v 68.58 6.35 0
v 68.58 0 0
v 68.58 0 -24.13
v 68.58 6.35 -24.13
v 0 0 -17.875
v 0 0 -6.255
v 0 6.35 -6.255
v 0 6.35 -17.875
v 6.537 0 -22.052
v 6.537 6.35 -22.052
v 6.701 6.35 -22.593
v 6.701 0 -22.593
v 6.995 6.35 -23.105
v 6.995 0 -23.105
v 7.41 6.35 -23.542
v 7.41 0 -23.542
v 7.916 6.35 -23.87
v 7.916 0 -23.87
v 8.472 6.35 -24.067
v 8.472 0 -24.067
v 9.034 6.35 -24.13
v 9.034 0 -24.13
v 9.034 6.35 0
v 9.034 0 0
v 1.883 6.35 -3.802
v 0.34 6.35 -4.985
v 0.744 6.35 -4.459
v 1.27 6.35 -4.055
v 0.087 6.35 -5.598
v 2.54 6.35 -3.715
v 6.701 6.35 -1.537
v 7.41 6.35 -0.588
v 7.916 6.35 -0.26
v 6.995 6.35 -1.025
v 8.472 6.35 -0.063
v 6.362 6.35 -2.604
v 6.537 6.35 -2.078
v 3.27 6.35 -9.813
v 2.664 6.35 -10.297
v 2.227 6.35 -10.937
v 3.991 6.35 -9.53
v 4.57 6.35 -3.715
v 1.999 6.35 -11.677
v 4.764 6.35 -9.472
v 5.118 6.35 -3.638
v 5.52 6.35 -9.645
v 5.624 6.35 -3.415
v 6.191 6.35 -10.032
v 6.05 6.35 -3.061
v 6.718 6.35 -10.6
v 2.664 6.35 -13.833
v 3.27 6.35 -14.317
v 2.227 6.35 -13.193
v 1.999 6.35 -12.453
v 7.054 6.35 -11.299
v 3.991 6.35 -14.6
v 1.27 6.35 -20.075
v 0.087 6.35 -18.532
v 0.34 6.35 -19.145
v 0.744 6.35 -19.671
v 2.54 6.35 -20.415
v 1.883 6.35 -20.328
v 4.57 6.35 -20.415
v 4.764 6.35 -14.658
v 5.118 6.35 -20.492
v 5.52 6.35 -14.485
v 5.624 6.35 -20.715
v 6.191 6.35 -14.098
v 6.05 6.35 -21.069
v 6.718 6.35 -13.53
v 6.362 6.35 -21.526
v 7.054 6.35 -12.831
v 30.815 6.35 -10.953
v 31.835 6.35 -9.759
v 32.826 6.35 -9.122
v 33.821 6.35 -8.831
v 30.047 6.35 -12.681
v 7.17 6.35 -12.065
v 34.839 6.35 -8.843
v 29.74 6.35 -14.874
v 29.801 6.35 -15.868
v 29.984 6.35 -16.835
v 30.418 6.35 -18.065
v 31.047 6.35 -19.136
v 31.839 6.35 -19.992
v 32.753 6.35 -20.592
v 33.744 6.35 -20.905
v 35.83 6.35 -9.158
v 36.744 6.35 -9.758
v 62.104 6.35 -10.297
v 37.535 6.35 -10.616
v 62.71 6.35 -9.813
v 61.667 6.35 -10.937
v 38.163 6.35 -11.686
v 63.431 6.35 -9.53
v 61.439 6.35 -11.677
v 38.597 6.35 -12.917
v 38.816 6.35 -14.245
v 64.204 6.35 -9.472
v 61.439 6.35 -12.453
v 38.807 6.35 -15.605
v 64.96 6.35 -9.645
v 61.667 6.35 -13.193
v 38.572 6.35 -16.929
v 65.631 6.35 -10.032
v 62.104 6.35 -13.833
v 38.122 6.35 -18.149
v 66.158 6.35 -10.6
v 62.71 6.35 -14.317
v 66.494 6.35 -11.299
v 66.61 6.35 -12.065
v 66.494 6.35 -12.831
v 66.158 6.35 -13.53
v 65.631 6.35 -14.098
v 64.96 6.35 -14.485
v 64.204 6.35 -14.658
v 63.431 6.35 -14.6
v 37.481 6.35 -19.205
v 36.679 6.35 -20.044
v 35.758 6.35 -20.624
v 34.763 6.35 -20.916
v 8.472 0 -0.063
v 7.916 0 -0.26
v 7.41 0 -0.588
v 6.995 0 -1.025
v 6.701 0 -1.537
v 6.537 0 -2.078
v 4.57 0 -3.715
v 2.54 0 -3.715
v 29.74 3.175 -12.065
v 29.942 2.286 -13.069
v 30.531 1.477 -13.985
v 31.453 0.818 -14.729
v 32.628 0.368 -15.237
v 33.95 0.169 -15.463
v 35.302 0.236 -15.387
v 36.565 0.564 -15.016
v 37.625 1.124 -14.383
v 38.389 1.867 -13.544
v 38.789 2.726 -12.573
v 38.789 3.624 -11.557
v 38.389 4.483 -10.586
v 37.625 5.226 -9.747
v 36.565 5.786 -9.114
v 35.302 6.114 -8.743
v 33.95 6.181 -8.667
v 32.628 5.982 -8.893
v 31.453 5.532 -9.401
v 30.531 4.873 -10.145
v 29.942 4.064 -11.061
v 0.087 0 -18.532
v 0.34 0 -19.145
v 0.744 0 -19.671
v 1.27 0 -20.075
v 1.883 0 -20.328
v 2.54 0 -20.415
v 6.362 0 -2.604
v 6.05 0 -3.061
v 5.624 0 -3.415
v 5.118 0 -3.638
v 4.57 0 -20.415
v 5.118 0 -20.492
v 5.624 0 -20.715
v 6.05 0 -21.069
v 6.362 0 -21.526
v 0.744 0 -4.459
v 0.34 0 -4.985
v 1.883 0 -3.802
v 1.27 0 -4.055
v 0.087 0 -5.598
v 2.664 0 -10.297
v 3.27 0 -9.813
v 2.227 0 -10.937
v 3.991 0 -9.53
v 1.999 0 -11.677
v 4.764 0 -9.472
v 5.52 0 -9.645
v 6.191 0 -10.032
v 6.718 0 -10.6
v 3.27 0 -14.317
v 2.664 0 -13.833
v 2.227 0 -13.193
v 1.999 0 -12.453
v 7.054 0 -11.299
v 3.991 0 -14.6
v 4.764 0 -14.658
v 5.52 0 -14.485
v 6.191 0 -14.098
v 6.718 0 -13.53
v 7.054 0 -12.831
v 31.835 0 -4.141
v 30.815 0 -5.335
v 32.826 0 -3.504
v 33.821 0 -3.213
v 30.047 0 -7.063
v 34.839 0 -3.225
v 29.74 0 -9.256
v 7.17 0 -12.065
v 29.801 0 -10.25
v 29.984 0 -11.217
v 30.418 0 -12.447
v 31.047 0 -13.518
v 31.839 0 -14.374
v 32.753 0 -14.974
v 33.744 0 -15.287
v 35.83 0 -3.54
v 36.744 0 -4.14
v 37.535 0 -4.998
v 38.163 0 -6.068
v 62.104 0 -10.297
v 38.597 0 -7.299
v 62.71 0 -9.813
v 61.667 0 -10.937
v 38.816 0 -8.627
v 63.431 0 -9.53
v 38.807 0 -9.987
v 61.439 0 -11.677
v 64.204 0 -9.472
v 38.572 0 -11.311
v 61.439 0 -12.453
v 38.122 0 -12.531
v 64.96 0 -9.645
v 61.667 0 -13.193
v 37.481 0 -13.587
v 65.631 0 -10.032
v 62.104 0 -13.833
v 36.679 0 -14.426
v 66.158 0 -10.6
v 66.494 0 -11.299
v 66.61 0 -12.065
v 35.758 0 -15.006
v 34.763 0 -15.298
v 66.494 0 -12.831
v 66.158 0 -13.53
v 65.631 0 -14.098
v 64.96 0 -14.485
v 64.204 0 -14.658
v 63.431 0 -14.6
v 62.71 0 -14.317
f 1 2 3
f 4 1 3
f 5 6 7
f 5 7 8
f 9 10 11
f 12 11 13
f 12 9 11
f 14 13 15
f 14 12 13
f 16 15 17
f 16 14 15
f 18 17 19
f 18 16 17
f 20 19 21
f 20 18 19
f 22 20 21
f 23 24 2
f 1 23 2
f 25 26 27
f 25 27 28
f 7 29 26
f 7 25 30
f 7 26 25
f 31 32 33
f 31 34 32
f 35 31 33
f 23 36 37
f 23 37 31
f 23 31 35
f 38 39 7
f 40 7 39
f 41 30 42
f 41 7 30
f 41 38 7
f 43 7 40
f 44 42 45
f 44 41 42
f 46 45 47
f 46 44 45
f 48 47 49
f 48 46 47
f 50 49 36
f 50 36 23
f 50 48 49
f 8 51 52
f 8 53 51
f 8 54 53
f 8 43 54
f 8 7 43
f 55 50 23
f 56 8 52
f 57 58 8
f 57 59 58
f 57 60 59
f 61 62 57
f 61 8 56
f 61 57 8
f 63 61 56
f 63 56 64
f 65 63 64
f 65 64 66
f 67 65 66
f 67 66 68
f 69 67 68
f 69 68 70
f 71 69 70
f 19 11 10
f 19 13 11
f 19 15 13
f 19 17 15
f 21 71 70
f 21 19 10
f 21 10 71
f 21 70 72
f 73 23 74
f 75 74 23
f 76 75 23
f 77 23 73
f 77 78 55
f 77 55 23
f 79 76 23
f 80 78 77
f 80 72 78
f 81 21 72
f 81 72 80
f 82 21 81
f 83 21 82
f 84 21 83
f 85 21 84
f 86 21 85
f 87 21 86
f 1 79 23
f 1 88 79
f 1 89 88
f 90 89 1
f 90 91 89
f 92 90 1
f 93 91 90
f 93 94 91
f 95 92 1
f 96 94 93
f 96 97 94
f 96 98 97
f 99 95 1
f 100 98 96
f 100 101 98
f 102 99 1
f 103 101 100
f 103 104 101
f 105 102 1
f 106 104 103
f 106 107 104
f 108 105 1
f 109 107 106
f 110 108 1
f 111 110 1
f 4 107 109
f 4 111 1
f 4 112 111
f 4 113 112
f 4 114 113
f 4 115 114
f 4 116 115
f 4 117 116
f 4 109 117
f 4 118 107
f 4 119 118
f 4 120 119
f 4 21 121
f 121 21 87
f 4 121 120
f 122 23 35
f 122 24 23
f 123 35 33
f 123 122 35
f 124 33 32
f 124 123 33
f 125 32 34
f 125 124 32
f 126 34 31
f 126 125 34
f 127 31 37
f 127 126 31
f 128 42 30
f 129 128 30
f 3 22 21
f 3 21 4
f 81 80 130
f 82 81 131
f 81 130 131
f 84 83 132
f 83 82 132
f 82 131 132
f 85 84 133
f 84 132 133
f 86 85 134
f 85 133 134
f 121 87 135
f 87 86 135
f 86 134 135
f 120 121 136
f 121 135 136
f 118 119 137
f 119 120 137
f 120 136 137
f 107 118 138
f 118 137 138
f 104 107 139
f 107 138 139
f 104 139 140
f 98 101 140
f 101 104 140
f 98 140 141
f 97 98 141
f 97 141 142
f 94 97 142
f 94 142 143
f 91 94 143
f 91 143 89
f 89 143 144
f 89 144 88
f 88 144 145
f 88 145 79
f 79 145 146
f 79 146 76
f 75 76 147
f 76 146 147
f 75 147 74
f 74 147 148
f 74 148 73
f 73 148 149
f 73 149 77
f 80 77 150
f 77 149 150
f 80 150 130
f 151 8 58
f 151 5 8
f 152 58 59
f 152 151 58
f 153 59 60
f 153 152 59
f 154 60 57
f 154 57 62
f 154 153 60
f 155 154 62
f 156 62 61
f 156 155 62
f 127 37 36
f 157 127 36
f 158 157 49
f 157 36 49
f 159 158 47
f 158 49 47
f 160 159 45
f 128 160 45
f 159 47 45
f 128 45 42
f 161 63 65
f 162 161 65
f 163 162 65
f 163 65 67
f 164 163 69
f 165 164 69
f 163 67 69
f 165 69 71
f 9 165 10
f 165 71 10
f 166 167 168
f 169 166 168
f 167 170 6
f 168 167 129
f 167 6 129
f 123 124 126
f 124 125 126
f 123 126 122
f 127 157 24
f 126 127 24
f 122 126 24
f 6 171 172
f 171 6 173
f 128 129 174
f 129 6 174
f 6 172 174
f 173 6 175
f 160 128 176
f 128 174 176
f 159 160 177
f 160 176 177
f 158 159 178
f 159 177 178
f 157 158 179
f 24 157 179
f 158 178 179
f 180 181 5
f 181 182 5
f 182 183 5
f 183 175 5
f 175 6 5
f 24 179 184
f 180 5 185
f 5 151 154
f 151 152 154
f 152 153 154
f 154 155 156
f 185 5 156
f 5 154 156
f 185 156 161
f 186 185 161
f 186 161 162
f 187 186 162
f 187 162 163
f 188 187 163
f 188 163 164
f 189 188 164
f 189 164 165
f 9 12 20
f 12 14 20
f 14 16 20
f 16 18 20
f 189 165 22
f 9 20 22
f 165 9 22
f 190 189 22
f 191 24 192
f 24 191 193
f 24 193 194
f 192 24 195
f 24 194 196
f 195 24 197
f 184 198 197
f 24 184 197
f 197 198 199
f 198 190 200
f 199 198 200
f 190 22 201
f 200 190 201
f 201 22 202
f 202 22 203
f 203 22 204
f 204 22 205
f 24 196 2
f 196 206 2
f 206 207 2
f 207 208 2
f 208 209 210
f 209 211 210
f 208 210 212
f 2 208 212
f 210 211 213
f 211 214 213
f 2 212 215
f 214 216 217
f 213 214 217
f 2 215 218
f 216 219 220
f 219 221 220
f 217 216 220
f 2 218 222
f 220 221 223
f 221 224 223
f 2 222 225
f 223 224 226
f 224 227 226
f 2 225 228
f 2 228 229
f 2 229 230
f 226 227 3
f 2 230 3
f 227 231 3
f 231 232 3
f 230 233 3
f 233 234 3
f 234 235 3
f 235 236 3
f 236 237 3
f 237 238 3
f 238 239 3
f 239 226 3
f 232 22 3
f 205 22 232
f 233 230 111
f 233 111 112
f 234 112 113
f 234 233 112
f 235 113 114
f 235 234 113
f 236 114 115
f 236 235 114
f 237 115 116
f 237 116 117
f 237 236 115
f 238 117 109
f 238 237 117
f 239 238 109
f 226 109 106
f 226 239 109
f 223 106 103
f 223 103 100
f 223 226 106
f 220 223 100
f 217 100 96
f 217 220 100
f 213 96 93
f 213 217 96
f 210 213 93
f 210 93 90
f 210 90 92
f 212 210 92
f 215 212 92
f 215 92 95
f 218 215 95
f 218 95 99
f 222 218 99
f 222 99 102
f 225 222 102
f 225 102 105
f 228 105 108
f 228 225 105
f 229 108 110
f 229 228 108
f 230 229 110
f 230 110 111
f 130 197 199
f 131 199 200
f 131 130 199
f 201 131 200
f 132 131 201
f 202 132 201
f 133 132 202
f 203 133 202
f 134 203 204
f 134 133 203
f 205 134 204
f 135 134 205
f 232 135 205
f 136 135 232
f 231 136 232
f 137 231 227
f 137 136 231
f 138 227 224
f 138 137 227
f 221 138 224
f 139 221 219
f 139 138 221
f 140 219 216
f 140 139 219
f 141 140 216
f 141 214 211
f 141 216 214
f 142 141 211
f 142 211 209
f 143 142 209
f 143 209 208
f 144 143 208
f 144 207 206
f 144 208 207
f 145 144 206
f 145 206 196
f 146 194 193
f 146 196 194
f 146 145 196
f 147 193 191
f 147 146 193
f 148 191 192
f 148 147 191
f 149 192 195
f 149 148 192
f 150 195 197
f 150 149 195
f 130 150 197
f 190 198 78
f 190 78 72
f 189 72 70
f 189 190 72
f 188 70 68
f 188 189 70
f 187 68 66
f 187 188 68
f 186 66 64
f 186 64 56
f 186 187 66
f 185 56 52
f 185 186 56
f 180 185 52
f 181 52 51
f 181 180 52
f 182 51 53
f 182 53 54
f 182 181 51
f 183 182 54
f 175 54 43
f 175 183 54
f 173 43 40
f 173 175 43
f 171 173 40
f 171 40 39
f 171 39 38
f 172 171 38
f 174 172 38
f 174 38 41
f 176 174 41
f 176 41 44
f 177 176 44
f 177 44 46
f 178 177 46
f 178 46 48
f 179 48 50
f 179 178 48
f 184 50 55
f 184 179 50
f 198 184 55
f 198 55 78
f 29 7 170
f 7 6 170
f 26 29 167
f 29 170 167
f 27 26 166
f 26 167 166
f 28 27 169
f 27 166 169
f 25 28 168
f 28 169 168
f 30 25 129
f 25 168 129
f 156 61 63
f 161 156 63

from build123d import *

# Parameters (mm, degrees)
SKETCH2_W                      = 68.58
SKETCH2_H                      = 24.13
SKETCH2_R                      = 2.6
BOSS_EXTRUDE1_DEPTH            = 6.35
CUT_EXTRUDE1_DEPTH             = 7.35
FILLET3_R                      = 2.54
CUT_EXTRUDE2_REACH             = 12.372
SKETCH7_R                      = 4.55
CUT_EXTRUDE2_DIRECTION_2_REACH = 12.372


with BuildPart() as part:
    # Sketch2 → Boss-Extrude1 (new body)
    with BuildSketch(Plane(origin=(0, 0, 0), x_dir=(1, 0, 0), z_dir=(0, 1, 0))):
        with Locations((34.29, 12.065)):
            Rectangle(SKETCH2_W, SKETCH2_H)
        with Locations((4.57, 12.065)):
            Circle(SKETCH2_R, mode=Mode.SUBTRACT)
        with Locations((64.01, 12.065)):
            Circle(SKETCH2_R, mode=Mode.SUBTRACT)
    extrude(amount=BOSS_EXTRUDE1_DEPTH)

    # Sketch3 → Cut-Extrude1 (cut, through all)
    with BuildSketch(Plane(origin=(0, 6.35, 0), x_dir=(1, 0, 0), z_dir=(0, 1, 0))):
        with BuildLine():
            Line((4.57, 3.715), (0, 3.715))
            Line((0, 3.715), (0, 0))
            Line((0, 0), (6.57, 0))
            Line((6.57, 0), (6.57, 1.715))
            ThreePointArc((6.57, 1.715), (5.984213562, 3.129213562), (4.57, 3.715))
        make_face()
        with BuildLine():
            ThreePointArc((4.57, 20.415), (5.984213562, 21.000786438), (6.57, 22.415))
            Line((6.57, 22.415), (6.57, 24.13))
            Line((6.57, 24.13), (0, 24.13))
            Line((0, 24.13), (0, 20.415))
            Line((0, 20.415), (4.57, 20.415))
        make_face()
    extrude(amount=-CUT_EXTRUDE1_DEPTH, mode=Mode.SUBTRACT)

    # Fillet3
    fillet3_edges = [part.edges().sort_by_distance(p)[0] for p in [
        (6.57, 3.175, 0),
        (0, 3.175, -3.715),
        (0, 3.175, -20.415),
        (6.57, 3.175, -24.13),
    ]]
    fillet(fillet3_edges, radius=FILLET3_R)

    # Sketch7 → Cut-Extrude2 (cut, up to next)
    with BuildSketch(Plane(origin=(0, 7.768502242, -6.872990202), x_dir=(-1, 0, 0), z_dir=(0, -0.748955721, 0.662620048)), mode=Mode.PRIVATE) as cut_extrude2_sk1:
        with Locations((-34.29, 6.932332118)):
            Circle(SKETCH7_R)
    cut_extrude2_tool1 = extrude(cut_extrude2_sk1.sketch, amount=-CUT_EXTRUDE2_REACH, mode=Mode.PRIVATE) & part.part
    add(cut_extrude2_tool1.solids().sort_by_distance((34.29, 3.175, -12.065))[0], mode=Mode.SUBTRACT)

    # Sketch7 → Cut-Extrude2 direction 2 (cut, up to next)
    with BuildSketch(Plane(origin=(0, 7.768502242, -6.872990202), x_dir=(-1, 0, 0), z_dir=(0, -0.748955721, 0.662620048)), mode=Mode.PRIVATE) as cut_extrude2_direction_2_sk1:
        with Locations((-34.29, 6.932332118)):
            Circle(SKETCH7_R)
    cut_extrude2_direction_2_tool1 = extrude(cut_extrude2_direction_2_sk1.sketch, amount=CUT_EXTRUDE2_DIRECTION_2_REACH, mode=Mode.PRIVATE) & part.part
    add(cut_extrude2_direction_2_tool1.solids().sort_by_distance((34.29, 3.175, -12.065))[0], mode=Mode.SUBTRACT)


solid = part.part
